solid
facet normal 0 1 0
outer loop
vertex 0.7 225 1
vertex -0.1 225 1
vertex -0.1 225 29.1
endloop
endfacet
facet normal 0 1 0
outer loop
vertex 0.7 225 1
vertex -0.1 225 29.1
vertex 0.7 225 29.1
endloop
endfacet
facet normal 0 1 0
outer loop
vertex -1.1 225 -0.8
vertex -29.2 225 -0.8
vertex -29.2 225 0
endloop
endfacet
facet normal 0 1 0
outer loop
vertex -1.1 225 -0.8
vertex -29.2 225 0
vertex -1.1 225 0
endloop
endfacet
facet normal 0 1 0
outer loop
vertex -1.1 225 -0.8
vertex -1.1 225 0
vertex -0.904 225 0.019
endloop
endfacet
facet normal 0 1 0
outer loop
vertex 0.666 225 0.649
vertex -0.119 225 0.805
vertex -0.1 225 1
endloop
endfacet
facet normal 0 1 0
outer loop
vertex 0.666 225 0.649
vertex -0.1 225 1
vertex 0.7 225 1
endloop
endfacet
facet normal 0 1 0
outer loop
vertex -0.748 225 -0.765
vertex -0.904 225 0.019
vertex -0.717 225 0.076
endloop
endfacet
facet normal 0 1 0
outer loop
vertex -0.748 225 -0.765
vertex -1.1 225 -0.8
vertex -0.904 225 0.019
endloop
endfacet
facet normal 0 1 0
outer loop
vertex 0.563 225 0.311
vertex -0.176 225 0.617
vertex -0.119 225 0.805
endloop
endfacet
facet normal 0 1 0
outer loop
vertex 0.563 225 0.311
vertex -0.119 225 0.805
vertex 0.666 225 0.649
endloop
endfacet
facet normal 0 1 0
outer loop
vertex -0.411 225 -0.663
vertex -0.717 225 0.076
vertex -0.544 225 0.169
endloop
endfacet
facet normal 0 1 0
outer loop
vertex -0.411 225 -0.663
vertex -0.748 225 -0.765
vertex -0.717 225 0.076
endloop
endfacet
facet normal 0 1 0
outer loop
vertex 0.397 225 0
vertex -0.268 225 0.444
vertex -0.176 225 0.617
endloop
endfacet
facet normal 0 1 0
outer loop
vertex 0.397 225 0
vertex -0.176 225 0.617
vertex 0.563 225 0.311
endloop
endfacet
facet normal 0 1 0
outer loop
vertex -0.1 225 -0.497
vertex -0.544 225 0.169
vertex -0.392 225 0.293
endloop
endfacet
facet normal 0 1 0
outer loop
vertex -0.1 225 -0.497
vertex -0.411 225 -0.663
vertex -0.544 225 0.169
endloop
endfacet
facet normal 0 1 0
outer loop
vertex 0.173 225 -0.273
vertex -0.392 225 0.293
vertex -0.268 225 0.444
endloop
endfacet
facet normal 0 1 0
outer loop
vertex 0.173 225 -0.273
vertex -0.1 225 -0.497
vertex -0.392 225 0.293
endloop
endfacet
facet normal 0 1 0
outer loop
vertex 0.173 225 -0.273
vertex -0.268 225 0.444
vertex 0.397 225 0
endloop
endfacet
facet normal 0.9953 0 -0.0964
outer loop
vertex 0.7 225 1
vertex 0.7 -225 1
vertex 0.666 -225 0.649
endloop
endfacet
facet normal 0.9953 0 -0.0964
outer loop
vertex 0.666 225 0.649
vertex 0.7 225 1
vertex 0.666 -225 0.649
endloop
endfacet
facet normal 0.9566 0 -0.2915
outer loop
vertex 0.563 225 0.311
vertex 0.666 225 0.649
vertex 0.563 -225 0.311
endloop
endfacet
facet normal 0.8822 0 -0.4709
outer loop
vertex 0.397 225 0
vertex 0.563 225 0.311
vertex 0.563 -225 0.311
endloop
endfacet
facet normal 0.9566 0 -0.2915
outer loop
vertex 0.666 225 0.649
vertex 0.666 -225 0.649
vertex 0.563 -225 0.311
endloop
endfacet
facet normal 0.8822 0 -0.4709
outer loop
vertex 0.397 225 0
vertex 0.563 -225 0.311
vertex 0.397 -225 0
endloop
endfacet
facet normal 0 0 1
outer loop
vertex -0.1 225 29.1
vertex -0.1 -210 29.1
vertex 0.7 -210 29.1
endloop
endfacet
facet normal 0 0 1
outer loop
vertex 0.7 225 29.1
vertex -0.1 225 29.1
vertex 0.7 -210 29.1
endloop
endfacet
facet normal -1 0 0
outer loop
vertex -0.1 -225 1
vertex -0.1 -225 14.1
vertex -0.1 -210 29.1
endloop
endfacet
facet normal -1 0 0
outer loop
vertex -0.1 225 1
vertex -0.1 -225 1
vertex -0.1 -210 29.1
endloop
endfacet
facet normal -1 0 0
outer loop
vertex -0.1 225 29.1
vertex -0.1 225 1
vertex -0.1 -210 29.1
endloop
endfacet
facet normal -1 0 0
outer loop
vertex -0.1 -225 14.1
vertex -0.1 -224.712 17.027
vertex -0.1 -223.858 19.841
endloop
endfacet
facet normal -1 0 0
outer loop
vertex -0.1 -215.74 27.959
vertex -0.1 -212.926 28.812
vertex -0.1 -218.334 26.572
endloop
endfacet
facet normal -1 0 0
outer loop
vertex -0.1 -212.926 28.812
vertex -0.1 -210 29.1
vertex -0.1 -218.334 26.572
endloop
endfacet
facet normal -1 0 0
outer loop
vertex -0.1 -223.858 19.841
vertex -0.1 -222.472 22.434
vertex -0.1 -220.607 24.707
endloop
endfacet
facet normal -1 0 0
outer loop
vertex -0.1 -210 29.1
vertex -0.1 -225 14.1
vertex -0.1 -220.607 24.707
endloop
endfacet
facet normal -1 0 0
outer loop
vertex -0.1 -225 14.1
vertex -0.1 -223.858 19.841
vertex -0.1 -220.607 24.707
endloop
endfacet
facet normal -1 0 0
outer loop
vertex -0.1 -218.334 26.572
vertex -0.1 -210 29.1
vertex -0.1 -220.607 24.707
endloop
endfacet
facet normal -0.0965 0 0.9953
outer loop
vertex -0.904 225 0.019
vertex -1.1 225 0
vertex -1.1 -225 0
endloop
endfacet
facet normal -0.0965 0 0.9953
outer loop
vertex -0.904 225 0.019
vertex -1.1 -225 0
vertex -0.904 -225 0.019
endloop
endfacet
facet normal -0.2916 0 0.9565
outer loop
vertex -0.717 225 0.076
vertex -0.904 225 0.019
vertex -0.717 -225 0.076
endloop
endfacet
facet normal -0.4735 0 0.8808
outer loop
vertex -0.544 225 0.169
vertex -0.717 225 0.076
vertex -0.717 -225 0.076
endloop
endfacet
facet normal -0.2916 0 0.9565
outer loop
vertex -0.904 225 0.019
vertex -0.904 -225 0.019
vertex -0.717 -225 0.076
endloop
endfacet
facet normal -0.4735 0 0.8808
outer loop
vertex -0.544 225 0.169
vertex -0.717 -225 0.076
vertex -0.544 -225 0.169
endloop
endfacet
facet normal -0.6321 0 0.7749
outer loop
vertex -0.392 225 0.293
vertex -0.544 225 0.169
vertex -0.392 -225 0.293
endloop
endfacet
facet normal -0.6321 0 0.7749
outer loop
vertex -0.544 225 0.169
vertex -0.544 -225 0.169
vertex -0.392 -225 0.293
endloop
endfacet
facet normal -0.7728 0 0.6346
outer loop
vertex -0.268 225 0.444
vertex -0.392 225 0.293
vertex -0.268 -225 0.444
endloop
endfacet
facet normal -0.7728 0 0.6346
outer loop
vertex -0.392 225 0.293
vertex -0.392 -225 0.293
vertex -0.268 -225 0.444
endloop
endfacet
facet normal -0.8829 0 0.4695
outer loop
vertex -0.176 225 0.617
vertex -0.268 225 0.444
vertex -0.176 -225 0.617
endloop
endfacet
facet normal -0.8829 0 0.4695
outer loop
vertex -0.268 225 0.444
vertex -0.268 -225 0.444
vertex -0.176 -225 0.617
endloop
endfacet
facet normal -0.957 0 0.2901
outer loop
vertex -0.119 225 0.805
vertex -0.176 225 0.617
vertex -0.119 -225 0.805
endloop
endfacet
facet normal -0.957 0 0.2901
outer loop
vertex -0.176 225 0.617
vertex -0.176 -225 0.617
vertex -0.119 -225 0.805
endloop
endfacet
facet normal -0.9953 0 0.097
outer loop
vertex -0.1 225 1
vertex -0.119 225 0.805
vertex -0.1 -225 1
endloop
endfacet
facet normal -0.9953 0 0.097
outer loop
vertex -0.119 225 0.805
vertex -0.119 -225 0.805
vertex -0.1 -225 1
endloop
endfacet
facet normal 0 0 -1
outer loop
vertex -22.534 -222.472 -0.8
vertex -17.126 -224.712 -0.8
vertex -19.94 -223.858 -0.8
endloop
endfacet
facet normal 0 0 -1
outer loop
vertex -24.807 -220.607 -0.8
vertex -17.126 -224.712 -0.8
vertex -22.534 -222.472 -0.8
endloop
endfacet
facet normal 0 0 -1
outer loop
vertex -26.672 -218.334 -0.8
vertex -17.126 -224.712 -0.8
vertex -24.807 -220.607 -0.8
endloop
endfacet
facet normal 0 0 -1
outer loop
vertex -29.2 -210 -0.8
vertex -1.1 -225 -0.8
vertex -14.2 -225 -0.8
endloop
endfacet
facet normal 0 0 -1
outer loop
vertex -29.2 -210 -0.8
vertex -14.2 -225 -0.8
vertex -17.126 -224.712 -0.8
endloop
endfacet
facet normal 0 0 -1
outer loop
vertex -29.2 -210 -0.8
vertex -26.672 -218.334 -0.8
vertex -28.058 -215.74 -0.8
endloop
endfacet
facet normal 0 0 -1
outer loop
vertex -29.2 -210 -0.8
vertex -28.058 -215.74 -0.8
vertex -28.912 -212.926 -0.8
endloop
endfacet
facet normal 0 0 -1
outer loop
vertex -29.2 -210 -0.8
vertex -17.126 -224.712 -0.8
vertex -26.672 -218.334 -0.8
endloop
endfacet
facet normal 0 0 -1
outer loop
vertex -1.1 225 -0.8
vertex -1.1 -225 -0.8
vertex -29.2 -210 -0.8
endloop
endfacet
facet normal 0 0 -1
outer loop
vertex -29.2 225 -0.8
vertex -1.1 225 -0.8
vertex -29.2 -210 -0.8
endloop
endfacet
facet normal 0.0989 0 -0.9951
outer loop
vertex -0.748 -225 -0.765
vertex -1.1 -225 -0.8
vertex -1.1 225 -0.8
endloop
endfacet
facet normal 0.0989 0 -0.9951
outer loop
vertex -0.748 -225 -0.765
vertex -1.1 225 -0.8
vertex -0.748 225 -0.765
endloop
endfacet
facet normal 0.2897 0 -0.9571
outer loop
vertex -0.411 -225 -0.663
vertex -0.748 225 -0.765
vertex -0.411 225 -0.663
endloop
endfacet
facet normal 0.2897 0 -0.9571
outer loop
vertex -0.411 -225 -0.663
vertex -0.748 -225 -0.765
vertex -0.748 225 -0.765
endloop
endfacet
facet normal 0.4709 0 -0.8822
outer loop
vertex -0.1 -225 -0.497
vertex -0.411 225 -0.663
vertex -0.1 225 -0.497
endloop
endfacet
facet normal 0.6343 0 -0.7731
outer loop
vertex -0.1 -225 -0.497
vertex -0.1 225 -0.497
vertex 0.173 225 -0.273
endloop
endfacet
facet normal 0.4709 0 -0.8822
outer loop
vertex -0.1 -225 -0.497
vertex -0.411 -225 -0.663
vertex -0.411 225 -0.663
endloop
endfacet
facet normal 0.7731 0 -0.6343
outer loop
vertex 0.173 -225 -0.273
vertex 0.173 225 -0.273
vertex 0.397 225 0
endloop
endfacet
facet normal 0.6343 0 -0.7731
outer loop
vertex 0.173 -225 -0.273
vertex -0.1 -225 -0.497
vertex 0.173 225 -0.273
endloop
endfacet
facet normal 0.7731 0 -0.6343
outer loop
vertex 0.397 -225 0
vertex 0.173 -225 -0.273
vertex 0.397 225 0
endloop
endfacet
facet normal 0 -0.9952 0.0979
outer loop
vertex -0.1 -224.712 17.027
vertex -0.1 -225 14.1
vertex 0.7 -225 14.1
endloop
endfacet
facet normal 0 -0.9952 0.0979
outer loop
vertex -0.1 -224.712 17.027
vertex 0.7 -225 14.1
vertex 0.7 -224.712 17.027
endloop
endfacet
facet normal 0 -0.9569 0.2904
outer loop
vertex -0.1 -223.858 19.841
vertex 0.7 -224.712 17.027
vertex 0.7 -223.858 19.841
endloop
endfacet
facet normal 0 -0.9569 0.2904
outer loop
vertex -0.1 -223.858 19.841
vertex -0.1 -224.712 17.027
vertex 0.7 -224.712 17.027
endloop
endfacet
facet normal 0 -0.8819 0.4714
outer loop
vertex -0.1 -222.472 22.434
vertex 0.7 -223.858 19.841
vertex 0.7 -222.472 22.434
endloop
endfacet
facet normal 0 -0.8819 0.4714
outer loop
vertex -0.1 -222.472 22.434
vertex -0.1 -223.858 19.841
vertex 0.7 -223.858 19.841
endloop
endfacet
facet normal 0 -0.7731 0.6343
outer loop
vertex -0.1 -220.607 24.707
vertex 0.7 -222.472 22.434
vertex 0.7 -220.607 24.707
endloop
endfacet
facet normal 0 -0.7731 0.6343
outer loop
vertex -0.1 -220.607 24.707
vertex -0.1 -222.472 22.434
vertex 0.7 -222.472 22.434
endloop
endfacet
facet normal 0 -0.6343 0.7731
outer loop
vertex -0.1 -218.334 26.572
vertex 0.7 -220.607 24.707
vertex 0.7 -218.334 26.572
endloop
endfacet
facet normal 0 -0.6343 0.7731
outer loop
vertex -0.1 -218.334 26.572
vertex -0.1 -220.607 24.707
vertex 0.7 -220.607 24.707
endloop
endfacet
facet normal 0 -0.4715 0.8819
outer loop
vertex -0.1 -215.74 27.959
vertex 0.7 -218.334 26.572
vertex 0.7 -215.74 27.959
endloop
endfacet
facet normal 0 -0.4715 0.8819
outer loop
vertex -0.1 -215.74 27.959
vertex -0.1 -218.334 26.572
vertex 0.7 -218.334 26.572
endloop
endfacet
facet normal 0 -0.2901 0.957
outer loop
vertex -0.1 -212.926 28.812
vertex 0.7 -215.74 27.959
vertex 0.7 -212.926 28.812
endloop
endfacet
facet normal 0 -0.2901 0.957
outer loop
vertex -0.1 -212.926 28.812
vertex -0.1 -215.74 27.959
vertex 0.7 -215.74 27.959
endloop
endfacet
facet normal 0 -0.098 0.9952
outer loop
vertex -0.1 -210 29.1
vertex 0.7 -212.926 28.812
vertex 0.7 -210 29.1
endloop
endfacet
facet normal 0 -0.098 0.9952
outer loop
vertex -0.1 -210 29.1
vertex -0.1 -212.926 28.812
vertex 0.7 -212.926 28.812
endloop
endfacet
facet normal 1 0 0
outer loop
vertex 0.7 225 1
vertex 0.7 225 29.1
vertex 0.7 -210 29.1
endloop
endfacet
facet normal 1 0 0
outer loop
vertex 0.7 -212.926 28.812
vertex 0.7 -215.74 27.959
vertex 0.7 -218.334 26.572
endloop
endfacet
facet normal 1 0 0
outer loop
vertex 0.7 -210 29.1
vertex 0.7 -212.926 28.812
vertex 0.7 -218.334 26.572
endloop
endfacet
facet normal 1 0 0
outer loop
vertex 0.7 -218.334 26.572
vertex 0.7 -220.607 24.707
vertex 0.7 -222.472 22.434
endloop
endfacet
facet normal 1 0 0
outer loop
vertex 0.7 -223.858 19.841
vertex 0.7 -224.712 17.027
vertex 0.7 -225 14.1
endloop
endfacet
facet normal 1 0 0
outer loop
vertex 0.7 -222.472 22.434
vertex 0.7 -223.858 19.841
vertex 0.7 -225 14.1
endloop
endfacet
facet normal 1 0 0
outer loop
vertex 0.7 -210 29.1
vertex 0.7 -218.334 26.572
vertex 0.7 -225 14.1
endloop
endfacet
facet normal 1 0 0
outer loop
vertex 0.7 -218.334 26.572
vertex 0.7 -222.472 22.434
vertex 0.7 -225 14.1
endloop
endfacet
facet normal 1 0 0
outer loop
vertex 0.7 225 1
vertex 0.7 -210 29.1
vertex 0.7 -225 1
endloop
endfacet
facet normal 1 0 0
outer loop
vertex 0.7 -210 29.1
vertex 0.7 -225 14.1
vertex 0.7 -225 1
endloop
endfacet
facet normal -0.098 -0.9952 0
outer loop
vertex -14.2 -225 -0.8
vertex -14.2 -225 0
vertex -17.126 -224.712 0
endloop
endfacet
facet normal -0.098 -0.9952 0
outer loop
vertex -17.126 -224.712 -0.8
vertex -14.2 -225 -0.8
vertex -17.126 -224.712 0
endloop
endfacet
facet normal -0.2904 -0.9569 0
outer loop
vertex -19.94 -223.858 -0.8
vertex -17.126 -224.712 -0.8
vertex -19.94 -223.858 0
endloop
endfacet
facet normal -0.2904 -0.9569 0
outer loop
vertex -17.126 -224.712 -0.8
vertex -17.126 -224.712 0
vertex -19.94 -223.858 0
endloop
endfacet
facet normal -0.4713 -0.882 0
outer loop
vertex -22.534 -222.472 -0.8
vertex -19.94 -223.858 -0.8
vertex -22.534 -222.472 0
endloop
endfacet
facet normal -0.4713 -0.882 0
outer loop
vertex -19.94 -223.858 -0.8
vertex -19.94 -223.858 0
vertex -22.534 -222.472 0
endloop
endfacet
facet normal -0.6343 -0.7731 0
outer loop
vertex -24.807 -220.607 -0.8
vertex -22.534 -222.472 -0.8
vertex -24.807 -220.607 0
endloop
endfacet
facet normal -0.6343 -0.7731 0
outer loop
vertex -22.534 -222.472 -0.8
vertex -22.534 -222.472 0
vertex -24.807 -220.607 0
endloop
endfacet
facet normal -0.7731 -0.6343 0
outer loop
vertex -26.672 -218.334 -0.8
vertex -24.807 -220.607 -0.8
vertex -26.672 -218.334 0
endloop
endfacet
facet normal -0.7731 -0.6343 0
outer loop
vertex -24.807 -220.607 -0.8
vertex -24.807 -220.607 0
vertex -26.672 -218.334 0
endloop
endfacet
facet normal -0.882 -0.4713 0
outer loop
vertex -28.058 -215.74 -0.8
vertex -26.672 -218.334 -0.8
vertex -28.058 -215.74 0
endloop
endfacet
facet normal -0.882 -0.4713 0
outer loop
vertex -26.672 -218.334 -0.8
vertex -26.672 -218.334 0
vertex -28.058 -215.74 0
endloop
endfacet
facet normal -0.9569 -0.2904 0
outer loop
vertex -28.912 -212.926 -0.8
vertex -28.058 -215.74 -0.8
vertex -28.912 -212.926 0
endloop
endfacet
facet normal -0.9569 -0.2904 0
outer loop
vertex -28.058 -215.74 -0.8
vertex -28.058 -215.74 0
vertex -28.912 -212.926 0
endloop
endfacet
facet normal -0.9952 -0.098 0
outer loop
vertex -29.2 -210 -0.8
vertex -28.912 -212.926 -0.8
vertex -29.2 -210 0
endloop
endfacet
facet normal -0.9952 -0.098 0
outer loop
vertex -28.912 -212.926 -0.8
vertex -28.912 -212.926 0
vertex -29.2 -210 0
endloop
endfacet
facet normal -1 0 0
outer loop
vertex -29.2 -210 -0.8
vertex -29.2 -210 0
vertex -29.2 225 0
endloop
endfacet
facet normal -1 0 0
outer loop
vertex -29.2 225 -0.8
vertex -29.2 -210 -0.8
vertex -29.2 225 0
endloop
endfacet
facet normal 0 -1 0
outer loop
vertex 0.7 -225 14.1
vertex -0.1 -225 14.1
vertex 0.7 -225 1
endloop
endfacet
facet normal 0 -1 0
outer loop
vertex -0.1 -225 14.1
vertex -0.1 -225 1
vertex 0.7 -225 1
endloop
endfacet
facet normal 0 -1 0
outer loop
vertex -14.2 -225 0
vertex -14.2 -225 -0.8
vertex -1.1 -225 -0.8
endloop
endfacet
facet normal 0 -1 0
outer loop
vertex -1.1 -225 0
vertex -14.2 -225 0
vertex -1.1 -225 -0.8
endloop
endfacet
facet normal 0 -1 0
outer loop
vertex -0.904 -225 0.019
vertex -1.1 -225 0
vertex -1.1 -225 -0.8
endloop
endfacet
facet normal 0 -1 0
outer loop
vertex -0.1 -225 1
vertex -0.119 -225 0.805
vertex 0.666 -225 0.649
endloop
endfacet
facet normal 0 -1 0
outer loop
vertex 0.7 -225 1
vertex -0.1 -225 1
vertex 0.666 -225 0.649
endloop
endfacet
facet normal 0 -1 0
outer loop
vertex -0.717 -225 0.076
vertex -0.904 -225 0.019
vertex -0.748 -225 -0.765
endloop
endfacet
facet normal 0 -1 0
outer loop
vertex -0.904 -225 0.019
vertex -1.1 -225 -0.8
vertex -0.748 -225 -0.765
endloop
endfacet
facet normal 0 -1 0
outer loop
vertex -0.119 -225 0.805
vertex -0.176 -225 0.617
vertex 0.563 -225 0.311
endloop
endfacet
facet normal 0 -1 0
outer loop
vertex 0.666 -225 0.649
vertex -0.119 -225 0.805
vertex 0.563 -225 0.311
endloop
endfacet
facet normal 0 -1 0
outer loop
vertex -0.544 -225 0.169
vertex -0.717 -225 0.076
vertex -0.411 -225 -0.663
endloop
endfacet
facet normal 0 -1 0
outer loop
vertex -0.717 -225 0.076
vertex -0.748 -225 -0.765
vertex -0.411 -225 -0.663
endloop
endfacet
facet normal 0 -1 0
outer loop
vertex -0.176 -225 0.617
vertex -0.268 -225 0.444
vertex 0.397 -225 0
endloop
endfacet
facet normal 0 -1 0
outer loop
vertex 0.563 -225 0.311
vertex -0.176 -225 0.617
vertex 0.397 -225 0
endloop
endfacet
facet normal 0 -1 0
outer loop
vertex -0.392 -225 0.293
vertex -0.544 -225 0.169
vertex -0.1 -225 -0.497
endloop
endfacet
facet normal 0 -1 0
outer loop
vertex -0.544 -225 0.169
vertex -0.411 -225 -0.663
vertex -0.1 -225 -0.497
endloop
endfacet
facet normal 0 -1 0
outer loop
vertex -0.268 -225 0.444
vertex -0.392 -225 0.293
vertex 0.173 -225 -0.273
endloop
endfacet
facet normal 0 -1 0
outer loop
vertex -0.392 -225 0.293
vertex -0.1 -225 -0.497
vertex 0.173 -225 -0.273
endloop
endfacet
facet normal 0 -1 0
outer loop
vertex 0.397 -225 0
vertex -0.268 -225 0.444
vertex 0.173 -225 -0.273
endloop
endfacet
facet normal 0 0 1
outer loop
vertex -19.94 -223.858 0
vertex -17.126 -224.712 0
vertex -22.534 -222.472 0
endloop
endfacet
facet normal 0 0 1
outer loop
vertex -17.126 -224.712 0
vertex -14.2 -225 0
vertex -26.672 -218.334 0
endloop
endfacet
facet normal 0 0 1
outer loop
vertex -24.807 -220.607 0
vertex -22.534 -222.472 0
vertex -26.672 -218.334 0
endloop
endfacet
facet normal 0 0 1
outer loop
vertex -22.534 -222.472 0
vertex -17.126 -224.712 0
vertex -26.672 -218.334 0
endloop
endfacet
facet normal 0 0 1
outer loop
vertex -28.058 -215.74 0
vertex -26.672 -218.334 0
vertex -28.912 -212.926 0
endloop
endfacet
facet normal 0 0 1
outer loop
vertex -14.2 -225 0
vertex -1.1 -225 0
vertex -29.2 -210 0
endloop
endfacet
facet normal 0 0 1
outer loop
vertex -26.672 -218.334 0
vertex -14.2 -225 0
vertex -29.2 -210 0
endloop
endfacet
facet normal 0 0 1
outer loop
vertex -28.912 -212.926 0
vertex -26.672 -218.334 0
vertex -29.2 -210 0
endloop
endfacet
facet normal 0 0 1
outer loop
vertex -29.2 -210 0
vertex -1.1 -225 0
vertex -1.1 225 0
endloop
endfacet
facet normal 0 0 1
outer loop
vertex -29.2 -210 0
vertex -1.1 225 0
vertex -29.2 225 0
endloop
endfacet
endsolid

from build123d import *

# Parameters (mm, degrees)
BASE_FLANGE1_DEPTH     = 0.8
SKETCHED_START         = -225
SKETCHED_BEND1_DEPTH   = 450
SKETCHED_BEND1_2_DEPTH = 450
SKETCHED_START_2       = -14.2
SKETCHED_BEND1_3_DEPTH = 16.2


with BuildPart() as part:
    # Base-Flange1: sheet metal written as solids
    # Sketch1 → Base-Flange1 (new body)
    with BuildSketch(Plane.XY):
        with BuildLine():
            Line((-29.2, 225), (29.2, 225))
            Line((29.2, 225), (29.2, -210))
            ThreePointArc((29.2, -210), (24.806601718, -220.606601718), (14.2, -225))
            Line((14.2, -225), (-14.2, -225))
            ThreePointArc((-14.2, -225), (-24.806601718, -220.606601718), (-29.2, -210))
            Line((-29.2, -210), (-29.2, 225))
        make_face()
    extrude(amount=-BASE_FLANGE1_DEPTH)

    # Sketched Bend1: read off the stored shape, not the designer's step
    # Sketched Bend1 outline → Sketched Bend1 (cut)
    with BuildSketch(Plane(origin=(0, 0, 0), x_dir=(1, 0, 0), z_dir=(0, 1, 0)).offset(SKETCHED_START)):
        with BuildLine():
            ThreePointArc((-1.099557429, 0.8), (-0.251029292, 0.587450787), (0.397105525, 0))
            Line((0.397105525, 0), (29.2, 0))
            Line((29.2, 0), (29.2, 0.8))
            Line((29.2, 0.8), (-1.099557429, 0.8))
        make_face()
    extrude(amount=SKETCHED_BEND1_DEPTH, mode=Mode.SUBTRACT)

    # Sketched Bend1 2 outline → Sketched Bend1 2 (add)
    with BuildSketch(Plane(origin=(0, 0, 0), x_dir=(1, 0, 0), z_dir=(0, 1, 0)).offset(SKETCHED_START)):
        with BuildLine():
            Line((0.700442571, -29.100442571), (0.700442571, -1))
            ThreePointArc((0.700442571, -1), (0.622939787, -0.477502784), (0.397105525, 0))
            Line((0.397105525, 0), (-1.099557429, 0))
            ThreePointArc((-1.099557429, 0), (-0.392450648, -0.292893219), (-0.099557429, -1))
            Line((-0.099557429, -1), (-0.099557429, -29.100442571))
            Line((-0.099557429, -29.100442571), (0.700442571, -29.100442571))
        make_face()
    extrude(amount=SKETCHED_BEND1_2_DEPTH)

    # Sketched Bend1 3 outline → Sketched Bend1 3 (cut)
    with BuildSketch(Plane.YZ.offset(SKETCHED_START_2)):
        with BuildLine():
            Line((-225, 29.100442571), (-225, 14.100442571))
            ThreePointArc((-225, 14.100442571), (-220.606601718, 24.707044289), (-210, 29.100442571))
            Line((-210, 29.100442571), (-225, 29.100442571))
        make_face()
    extrude(amount=SKETCHED_BEND1_3_DEPTH, mode=Mode.SUBTRACT)


solid = part.part
